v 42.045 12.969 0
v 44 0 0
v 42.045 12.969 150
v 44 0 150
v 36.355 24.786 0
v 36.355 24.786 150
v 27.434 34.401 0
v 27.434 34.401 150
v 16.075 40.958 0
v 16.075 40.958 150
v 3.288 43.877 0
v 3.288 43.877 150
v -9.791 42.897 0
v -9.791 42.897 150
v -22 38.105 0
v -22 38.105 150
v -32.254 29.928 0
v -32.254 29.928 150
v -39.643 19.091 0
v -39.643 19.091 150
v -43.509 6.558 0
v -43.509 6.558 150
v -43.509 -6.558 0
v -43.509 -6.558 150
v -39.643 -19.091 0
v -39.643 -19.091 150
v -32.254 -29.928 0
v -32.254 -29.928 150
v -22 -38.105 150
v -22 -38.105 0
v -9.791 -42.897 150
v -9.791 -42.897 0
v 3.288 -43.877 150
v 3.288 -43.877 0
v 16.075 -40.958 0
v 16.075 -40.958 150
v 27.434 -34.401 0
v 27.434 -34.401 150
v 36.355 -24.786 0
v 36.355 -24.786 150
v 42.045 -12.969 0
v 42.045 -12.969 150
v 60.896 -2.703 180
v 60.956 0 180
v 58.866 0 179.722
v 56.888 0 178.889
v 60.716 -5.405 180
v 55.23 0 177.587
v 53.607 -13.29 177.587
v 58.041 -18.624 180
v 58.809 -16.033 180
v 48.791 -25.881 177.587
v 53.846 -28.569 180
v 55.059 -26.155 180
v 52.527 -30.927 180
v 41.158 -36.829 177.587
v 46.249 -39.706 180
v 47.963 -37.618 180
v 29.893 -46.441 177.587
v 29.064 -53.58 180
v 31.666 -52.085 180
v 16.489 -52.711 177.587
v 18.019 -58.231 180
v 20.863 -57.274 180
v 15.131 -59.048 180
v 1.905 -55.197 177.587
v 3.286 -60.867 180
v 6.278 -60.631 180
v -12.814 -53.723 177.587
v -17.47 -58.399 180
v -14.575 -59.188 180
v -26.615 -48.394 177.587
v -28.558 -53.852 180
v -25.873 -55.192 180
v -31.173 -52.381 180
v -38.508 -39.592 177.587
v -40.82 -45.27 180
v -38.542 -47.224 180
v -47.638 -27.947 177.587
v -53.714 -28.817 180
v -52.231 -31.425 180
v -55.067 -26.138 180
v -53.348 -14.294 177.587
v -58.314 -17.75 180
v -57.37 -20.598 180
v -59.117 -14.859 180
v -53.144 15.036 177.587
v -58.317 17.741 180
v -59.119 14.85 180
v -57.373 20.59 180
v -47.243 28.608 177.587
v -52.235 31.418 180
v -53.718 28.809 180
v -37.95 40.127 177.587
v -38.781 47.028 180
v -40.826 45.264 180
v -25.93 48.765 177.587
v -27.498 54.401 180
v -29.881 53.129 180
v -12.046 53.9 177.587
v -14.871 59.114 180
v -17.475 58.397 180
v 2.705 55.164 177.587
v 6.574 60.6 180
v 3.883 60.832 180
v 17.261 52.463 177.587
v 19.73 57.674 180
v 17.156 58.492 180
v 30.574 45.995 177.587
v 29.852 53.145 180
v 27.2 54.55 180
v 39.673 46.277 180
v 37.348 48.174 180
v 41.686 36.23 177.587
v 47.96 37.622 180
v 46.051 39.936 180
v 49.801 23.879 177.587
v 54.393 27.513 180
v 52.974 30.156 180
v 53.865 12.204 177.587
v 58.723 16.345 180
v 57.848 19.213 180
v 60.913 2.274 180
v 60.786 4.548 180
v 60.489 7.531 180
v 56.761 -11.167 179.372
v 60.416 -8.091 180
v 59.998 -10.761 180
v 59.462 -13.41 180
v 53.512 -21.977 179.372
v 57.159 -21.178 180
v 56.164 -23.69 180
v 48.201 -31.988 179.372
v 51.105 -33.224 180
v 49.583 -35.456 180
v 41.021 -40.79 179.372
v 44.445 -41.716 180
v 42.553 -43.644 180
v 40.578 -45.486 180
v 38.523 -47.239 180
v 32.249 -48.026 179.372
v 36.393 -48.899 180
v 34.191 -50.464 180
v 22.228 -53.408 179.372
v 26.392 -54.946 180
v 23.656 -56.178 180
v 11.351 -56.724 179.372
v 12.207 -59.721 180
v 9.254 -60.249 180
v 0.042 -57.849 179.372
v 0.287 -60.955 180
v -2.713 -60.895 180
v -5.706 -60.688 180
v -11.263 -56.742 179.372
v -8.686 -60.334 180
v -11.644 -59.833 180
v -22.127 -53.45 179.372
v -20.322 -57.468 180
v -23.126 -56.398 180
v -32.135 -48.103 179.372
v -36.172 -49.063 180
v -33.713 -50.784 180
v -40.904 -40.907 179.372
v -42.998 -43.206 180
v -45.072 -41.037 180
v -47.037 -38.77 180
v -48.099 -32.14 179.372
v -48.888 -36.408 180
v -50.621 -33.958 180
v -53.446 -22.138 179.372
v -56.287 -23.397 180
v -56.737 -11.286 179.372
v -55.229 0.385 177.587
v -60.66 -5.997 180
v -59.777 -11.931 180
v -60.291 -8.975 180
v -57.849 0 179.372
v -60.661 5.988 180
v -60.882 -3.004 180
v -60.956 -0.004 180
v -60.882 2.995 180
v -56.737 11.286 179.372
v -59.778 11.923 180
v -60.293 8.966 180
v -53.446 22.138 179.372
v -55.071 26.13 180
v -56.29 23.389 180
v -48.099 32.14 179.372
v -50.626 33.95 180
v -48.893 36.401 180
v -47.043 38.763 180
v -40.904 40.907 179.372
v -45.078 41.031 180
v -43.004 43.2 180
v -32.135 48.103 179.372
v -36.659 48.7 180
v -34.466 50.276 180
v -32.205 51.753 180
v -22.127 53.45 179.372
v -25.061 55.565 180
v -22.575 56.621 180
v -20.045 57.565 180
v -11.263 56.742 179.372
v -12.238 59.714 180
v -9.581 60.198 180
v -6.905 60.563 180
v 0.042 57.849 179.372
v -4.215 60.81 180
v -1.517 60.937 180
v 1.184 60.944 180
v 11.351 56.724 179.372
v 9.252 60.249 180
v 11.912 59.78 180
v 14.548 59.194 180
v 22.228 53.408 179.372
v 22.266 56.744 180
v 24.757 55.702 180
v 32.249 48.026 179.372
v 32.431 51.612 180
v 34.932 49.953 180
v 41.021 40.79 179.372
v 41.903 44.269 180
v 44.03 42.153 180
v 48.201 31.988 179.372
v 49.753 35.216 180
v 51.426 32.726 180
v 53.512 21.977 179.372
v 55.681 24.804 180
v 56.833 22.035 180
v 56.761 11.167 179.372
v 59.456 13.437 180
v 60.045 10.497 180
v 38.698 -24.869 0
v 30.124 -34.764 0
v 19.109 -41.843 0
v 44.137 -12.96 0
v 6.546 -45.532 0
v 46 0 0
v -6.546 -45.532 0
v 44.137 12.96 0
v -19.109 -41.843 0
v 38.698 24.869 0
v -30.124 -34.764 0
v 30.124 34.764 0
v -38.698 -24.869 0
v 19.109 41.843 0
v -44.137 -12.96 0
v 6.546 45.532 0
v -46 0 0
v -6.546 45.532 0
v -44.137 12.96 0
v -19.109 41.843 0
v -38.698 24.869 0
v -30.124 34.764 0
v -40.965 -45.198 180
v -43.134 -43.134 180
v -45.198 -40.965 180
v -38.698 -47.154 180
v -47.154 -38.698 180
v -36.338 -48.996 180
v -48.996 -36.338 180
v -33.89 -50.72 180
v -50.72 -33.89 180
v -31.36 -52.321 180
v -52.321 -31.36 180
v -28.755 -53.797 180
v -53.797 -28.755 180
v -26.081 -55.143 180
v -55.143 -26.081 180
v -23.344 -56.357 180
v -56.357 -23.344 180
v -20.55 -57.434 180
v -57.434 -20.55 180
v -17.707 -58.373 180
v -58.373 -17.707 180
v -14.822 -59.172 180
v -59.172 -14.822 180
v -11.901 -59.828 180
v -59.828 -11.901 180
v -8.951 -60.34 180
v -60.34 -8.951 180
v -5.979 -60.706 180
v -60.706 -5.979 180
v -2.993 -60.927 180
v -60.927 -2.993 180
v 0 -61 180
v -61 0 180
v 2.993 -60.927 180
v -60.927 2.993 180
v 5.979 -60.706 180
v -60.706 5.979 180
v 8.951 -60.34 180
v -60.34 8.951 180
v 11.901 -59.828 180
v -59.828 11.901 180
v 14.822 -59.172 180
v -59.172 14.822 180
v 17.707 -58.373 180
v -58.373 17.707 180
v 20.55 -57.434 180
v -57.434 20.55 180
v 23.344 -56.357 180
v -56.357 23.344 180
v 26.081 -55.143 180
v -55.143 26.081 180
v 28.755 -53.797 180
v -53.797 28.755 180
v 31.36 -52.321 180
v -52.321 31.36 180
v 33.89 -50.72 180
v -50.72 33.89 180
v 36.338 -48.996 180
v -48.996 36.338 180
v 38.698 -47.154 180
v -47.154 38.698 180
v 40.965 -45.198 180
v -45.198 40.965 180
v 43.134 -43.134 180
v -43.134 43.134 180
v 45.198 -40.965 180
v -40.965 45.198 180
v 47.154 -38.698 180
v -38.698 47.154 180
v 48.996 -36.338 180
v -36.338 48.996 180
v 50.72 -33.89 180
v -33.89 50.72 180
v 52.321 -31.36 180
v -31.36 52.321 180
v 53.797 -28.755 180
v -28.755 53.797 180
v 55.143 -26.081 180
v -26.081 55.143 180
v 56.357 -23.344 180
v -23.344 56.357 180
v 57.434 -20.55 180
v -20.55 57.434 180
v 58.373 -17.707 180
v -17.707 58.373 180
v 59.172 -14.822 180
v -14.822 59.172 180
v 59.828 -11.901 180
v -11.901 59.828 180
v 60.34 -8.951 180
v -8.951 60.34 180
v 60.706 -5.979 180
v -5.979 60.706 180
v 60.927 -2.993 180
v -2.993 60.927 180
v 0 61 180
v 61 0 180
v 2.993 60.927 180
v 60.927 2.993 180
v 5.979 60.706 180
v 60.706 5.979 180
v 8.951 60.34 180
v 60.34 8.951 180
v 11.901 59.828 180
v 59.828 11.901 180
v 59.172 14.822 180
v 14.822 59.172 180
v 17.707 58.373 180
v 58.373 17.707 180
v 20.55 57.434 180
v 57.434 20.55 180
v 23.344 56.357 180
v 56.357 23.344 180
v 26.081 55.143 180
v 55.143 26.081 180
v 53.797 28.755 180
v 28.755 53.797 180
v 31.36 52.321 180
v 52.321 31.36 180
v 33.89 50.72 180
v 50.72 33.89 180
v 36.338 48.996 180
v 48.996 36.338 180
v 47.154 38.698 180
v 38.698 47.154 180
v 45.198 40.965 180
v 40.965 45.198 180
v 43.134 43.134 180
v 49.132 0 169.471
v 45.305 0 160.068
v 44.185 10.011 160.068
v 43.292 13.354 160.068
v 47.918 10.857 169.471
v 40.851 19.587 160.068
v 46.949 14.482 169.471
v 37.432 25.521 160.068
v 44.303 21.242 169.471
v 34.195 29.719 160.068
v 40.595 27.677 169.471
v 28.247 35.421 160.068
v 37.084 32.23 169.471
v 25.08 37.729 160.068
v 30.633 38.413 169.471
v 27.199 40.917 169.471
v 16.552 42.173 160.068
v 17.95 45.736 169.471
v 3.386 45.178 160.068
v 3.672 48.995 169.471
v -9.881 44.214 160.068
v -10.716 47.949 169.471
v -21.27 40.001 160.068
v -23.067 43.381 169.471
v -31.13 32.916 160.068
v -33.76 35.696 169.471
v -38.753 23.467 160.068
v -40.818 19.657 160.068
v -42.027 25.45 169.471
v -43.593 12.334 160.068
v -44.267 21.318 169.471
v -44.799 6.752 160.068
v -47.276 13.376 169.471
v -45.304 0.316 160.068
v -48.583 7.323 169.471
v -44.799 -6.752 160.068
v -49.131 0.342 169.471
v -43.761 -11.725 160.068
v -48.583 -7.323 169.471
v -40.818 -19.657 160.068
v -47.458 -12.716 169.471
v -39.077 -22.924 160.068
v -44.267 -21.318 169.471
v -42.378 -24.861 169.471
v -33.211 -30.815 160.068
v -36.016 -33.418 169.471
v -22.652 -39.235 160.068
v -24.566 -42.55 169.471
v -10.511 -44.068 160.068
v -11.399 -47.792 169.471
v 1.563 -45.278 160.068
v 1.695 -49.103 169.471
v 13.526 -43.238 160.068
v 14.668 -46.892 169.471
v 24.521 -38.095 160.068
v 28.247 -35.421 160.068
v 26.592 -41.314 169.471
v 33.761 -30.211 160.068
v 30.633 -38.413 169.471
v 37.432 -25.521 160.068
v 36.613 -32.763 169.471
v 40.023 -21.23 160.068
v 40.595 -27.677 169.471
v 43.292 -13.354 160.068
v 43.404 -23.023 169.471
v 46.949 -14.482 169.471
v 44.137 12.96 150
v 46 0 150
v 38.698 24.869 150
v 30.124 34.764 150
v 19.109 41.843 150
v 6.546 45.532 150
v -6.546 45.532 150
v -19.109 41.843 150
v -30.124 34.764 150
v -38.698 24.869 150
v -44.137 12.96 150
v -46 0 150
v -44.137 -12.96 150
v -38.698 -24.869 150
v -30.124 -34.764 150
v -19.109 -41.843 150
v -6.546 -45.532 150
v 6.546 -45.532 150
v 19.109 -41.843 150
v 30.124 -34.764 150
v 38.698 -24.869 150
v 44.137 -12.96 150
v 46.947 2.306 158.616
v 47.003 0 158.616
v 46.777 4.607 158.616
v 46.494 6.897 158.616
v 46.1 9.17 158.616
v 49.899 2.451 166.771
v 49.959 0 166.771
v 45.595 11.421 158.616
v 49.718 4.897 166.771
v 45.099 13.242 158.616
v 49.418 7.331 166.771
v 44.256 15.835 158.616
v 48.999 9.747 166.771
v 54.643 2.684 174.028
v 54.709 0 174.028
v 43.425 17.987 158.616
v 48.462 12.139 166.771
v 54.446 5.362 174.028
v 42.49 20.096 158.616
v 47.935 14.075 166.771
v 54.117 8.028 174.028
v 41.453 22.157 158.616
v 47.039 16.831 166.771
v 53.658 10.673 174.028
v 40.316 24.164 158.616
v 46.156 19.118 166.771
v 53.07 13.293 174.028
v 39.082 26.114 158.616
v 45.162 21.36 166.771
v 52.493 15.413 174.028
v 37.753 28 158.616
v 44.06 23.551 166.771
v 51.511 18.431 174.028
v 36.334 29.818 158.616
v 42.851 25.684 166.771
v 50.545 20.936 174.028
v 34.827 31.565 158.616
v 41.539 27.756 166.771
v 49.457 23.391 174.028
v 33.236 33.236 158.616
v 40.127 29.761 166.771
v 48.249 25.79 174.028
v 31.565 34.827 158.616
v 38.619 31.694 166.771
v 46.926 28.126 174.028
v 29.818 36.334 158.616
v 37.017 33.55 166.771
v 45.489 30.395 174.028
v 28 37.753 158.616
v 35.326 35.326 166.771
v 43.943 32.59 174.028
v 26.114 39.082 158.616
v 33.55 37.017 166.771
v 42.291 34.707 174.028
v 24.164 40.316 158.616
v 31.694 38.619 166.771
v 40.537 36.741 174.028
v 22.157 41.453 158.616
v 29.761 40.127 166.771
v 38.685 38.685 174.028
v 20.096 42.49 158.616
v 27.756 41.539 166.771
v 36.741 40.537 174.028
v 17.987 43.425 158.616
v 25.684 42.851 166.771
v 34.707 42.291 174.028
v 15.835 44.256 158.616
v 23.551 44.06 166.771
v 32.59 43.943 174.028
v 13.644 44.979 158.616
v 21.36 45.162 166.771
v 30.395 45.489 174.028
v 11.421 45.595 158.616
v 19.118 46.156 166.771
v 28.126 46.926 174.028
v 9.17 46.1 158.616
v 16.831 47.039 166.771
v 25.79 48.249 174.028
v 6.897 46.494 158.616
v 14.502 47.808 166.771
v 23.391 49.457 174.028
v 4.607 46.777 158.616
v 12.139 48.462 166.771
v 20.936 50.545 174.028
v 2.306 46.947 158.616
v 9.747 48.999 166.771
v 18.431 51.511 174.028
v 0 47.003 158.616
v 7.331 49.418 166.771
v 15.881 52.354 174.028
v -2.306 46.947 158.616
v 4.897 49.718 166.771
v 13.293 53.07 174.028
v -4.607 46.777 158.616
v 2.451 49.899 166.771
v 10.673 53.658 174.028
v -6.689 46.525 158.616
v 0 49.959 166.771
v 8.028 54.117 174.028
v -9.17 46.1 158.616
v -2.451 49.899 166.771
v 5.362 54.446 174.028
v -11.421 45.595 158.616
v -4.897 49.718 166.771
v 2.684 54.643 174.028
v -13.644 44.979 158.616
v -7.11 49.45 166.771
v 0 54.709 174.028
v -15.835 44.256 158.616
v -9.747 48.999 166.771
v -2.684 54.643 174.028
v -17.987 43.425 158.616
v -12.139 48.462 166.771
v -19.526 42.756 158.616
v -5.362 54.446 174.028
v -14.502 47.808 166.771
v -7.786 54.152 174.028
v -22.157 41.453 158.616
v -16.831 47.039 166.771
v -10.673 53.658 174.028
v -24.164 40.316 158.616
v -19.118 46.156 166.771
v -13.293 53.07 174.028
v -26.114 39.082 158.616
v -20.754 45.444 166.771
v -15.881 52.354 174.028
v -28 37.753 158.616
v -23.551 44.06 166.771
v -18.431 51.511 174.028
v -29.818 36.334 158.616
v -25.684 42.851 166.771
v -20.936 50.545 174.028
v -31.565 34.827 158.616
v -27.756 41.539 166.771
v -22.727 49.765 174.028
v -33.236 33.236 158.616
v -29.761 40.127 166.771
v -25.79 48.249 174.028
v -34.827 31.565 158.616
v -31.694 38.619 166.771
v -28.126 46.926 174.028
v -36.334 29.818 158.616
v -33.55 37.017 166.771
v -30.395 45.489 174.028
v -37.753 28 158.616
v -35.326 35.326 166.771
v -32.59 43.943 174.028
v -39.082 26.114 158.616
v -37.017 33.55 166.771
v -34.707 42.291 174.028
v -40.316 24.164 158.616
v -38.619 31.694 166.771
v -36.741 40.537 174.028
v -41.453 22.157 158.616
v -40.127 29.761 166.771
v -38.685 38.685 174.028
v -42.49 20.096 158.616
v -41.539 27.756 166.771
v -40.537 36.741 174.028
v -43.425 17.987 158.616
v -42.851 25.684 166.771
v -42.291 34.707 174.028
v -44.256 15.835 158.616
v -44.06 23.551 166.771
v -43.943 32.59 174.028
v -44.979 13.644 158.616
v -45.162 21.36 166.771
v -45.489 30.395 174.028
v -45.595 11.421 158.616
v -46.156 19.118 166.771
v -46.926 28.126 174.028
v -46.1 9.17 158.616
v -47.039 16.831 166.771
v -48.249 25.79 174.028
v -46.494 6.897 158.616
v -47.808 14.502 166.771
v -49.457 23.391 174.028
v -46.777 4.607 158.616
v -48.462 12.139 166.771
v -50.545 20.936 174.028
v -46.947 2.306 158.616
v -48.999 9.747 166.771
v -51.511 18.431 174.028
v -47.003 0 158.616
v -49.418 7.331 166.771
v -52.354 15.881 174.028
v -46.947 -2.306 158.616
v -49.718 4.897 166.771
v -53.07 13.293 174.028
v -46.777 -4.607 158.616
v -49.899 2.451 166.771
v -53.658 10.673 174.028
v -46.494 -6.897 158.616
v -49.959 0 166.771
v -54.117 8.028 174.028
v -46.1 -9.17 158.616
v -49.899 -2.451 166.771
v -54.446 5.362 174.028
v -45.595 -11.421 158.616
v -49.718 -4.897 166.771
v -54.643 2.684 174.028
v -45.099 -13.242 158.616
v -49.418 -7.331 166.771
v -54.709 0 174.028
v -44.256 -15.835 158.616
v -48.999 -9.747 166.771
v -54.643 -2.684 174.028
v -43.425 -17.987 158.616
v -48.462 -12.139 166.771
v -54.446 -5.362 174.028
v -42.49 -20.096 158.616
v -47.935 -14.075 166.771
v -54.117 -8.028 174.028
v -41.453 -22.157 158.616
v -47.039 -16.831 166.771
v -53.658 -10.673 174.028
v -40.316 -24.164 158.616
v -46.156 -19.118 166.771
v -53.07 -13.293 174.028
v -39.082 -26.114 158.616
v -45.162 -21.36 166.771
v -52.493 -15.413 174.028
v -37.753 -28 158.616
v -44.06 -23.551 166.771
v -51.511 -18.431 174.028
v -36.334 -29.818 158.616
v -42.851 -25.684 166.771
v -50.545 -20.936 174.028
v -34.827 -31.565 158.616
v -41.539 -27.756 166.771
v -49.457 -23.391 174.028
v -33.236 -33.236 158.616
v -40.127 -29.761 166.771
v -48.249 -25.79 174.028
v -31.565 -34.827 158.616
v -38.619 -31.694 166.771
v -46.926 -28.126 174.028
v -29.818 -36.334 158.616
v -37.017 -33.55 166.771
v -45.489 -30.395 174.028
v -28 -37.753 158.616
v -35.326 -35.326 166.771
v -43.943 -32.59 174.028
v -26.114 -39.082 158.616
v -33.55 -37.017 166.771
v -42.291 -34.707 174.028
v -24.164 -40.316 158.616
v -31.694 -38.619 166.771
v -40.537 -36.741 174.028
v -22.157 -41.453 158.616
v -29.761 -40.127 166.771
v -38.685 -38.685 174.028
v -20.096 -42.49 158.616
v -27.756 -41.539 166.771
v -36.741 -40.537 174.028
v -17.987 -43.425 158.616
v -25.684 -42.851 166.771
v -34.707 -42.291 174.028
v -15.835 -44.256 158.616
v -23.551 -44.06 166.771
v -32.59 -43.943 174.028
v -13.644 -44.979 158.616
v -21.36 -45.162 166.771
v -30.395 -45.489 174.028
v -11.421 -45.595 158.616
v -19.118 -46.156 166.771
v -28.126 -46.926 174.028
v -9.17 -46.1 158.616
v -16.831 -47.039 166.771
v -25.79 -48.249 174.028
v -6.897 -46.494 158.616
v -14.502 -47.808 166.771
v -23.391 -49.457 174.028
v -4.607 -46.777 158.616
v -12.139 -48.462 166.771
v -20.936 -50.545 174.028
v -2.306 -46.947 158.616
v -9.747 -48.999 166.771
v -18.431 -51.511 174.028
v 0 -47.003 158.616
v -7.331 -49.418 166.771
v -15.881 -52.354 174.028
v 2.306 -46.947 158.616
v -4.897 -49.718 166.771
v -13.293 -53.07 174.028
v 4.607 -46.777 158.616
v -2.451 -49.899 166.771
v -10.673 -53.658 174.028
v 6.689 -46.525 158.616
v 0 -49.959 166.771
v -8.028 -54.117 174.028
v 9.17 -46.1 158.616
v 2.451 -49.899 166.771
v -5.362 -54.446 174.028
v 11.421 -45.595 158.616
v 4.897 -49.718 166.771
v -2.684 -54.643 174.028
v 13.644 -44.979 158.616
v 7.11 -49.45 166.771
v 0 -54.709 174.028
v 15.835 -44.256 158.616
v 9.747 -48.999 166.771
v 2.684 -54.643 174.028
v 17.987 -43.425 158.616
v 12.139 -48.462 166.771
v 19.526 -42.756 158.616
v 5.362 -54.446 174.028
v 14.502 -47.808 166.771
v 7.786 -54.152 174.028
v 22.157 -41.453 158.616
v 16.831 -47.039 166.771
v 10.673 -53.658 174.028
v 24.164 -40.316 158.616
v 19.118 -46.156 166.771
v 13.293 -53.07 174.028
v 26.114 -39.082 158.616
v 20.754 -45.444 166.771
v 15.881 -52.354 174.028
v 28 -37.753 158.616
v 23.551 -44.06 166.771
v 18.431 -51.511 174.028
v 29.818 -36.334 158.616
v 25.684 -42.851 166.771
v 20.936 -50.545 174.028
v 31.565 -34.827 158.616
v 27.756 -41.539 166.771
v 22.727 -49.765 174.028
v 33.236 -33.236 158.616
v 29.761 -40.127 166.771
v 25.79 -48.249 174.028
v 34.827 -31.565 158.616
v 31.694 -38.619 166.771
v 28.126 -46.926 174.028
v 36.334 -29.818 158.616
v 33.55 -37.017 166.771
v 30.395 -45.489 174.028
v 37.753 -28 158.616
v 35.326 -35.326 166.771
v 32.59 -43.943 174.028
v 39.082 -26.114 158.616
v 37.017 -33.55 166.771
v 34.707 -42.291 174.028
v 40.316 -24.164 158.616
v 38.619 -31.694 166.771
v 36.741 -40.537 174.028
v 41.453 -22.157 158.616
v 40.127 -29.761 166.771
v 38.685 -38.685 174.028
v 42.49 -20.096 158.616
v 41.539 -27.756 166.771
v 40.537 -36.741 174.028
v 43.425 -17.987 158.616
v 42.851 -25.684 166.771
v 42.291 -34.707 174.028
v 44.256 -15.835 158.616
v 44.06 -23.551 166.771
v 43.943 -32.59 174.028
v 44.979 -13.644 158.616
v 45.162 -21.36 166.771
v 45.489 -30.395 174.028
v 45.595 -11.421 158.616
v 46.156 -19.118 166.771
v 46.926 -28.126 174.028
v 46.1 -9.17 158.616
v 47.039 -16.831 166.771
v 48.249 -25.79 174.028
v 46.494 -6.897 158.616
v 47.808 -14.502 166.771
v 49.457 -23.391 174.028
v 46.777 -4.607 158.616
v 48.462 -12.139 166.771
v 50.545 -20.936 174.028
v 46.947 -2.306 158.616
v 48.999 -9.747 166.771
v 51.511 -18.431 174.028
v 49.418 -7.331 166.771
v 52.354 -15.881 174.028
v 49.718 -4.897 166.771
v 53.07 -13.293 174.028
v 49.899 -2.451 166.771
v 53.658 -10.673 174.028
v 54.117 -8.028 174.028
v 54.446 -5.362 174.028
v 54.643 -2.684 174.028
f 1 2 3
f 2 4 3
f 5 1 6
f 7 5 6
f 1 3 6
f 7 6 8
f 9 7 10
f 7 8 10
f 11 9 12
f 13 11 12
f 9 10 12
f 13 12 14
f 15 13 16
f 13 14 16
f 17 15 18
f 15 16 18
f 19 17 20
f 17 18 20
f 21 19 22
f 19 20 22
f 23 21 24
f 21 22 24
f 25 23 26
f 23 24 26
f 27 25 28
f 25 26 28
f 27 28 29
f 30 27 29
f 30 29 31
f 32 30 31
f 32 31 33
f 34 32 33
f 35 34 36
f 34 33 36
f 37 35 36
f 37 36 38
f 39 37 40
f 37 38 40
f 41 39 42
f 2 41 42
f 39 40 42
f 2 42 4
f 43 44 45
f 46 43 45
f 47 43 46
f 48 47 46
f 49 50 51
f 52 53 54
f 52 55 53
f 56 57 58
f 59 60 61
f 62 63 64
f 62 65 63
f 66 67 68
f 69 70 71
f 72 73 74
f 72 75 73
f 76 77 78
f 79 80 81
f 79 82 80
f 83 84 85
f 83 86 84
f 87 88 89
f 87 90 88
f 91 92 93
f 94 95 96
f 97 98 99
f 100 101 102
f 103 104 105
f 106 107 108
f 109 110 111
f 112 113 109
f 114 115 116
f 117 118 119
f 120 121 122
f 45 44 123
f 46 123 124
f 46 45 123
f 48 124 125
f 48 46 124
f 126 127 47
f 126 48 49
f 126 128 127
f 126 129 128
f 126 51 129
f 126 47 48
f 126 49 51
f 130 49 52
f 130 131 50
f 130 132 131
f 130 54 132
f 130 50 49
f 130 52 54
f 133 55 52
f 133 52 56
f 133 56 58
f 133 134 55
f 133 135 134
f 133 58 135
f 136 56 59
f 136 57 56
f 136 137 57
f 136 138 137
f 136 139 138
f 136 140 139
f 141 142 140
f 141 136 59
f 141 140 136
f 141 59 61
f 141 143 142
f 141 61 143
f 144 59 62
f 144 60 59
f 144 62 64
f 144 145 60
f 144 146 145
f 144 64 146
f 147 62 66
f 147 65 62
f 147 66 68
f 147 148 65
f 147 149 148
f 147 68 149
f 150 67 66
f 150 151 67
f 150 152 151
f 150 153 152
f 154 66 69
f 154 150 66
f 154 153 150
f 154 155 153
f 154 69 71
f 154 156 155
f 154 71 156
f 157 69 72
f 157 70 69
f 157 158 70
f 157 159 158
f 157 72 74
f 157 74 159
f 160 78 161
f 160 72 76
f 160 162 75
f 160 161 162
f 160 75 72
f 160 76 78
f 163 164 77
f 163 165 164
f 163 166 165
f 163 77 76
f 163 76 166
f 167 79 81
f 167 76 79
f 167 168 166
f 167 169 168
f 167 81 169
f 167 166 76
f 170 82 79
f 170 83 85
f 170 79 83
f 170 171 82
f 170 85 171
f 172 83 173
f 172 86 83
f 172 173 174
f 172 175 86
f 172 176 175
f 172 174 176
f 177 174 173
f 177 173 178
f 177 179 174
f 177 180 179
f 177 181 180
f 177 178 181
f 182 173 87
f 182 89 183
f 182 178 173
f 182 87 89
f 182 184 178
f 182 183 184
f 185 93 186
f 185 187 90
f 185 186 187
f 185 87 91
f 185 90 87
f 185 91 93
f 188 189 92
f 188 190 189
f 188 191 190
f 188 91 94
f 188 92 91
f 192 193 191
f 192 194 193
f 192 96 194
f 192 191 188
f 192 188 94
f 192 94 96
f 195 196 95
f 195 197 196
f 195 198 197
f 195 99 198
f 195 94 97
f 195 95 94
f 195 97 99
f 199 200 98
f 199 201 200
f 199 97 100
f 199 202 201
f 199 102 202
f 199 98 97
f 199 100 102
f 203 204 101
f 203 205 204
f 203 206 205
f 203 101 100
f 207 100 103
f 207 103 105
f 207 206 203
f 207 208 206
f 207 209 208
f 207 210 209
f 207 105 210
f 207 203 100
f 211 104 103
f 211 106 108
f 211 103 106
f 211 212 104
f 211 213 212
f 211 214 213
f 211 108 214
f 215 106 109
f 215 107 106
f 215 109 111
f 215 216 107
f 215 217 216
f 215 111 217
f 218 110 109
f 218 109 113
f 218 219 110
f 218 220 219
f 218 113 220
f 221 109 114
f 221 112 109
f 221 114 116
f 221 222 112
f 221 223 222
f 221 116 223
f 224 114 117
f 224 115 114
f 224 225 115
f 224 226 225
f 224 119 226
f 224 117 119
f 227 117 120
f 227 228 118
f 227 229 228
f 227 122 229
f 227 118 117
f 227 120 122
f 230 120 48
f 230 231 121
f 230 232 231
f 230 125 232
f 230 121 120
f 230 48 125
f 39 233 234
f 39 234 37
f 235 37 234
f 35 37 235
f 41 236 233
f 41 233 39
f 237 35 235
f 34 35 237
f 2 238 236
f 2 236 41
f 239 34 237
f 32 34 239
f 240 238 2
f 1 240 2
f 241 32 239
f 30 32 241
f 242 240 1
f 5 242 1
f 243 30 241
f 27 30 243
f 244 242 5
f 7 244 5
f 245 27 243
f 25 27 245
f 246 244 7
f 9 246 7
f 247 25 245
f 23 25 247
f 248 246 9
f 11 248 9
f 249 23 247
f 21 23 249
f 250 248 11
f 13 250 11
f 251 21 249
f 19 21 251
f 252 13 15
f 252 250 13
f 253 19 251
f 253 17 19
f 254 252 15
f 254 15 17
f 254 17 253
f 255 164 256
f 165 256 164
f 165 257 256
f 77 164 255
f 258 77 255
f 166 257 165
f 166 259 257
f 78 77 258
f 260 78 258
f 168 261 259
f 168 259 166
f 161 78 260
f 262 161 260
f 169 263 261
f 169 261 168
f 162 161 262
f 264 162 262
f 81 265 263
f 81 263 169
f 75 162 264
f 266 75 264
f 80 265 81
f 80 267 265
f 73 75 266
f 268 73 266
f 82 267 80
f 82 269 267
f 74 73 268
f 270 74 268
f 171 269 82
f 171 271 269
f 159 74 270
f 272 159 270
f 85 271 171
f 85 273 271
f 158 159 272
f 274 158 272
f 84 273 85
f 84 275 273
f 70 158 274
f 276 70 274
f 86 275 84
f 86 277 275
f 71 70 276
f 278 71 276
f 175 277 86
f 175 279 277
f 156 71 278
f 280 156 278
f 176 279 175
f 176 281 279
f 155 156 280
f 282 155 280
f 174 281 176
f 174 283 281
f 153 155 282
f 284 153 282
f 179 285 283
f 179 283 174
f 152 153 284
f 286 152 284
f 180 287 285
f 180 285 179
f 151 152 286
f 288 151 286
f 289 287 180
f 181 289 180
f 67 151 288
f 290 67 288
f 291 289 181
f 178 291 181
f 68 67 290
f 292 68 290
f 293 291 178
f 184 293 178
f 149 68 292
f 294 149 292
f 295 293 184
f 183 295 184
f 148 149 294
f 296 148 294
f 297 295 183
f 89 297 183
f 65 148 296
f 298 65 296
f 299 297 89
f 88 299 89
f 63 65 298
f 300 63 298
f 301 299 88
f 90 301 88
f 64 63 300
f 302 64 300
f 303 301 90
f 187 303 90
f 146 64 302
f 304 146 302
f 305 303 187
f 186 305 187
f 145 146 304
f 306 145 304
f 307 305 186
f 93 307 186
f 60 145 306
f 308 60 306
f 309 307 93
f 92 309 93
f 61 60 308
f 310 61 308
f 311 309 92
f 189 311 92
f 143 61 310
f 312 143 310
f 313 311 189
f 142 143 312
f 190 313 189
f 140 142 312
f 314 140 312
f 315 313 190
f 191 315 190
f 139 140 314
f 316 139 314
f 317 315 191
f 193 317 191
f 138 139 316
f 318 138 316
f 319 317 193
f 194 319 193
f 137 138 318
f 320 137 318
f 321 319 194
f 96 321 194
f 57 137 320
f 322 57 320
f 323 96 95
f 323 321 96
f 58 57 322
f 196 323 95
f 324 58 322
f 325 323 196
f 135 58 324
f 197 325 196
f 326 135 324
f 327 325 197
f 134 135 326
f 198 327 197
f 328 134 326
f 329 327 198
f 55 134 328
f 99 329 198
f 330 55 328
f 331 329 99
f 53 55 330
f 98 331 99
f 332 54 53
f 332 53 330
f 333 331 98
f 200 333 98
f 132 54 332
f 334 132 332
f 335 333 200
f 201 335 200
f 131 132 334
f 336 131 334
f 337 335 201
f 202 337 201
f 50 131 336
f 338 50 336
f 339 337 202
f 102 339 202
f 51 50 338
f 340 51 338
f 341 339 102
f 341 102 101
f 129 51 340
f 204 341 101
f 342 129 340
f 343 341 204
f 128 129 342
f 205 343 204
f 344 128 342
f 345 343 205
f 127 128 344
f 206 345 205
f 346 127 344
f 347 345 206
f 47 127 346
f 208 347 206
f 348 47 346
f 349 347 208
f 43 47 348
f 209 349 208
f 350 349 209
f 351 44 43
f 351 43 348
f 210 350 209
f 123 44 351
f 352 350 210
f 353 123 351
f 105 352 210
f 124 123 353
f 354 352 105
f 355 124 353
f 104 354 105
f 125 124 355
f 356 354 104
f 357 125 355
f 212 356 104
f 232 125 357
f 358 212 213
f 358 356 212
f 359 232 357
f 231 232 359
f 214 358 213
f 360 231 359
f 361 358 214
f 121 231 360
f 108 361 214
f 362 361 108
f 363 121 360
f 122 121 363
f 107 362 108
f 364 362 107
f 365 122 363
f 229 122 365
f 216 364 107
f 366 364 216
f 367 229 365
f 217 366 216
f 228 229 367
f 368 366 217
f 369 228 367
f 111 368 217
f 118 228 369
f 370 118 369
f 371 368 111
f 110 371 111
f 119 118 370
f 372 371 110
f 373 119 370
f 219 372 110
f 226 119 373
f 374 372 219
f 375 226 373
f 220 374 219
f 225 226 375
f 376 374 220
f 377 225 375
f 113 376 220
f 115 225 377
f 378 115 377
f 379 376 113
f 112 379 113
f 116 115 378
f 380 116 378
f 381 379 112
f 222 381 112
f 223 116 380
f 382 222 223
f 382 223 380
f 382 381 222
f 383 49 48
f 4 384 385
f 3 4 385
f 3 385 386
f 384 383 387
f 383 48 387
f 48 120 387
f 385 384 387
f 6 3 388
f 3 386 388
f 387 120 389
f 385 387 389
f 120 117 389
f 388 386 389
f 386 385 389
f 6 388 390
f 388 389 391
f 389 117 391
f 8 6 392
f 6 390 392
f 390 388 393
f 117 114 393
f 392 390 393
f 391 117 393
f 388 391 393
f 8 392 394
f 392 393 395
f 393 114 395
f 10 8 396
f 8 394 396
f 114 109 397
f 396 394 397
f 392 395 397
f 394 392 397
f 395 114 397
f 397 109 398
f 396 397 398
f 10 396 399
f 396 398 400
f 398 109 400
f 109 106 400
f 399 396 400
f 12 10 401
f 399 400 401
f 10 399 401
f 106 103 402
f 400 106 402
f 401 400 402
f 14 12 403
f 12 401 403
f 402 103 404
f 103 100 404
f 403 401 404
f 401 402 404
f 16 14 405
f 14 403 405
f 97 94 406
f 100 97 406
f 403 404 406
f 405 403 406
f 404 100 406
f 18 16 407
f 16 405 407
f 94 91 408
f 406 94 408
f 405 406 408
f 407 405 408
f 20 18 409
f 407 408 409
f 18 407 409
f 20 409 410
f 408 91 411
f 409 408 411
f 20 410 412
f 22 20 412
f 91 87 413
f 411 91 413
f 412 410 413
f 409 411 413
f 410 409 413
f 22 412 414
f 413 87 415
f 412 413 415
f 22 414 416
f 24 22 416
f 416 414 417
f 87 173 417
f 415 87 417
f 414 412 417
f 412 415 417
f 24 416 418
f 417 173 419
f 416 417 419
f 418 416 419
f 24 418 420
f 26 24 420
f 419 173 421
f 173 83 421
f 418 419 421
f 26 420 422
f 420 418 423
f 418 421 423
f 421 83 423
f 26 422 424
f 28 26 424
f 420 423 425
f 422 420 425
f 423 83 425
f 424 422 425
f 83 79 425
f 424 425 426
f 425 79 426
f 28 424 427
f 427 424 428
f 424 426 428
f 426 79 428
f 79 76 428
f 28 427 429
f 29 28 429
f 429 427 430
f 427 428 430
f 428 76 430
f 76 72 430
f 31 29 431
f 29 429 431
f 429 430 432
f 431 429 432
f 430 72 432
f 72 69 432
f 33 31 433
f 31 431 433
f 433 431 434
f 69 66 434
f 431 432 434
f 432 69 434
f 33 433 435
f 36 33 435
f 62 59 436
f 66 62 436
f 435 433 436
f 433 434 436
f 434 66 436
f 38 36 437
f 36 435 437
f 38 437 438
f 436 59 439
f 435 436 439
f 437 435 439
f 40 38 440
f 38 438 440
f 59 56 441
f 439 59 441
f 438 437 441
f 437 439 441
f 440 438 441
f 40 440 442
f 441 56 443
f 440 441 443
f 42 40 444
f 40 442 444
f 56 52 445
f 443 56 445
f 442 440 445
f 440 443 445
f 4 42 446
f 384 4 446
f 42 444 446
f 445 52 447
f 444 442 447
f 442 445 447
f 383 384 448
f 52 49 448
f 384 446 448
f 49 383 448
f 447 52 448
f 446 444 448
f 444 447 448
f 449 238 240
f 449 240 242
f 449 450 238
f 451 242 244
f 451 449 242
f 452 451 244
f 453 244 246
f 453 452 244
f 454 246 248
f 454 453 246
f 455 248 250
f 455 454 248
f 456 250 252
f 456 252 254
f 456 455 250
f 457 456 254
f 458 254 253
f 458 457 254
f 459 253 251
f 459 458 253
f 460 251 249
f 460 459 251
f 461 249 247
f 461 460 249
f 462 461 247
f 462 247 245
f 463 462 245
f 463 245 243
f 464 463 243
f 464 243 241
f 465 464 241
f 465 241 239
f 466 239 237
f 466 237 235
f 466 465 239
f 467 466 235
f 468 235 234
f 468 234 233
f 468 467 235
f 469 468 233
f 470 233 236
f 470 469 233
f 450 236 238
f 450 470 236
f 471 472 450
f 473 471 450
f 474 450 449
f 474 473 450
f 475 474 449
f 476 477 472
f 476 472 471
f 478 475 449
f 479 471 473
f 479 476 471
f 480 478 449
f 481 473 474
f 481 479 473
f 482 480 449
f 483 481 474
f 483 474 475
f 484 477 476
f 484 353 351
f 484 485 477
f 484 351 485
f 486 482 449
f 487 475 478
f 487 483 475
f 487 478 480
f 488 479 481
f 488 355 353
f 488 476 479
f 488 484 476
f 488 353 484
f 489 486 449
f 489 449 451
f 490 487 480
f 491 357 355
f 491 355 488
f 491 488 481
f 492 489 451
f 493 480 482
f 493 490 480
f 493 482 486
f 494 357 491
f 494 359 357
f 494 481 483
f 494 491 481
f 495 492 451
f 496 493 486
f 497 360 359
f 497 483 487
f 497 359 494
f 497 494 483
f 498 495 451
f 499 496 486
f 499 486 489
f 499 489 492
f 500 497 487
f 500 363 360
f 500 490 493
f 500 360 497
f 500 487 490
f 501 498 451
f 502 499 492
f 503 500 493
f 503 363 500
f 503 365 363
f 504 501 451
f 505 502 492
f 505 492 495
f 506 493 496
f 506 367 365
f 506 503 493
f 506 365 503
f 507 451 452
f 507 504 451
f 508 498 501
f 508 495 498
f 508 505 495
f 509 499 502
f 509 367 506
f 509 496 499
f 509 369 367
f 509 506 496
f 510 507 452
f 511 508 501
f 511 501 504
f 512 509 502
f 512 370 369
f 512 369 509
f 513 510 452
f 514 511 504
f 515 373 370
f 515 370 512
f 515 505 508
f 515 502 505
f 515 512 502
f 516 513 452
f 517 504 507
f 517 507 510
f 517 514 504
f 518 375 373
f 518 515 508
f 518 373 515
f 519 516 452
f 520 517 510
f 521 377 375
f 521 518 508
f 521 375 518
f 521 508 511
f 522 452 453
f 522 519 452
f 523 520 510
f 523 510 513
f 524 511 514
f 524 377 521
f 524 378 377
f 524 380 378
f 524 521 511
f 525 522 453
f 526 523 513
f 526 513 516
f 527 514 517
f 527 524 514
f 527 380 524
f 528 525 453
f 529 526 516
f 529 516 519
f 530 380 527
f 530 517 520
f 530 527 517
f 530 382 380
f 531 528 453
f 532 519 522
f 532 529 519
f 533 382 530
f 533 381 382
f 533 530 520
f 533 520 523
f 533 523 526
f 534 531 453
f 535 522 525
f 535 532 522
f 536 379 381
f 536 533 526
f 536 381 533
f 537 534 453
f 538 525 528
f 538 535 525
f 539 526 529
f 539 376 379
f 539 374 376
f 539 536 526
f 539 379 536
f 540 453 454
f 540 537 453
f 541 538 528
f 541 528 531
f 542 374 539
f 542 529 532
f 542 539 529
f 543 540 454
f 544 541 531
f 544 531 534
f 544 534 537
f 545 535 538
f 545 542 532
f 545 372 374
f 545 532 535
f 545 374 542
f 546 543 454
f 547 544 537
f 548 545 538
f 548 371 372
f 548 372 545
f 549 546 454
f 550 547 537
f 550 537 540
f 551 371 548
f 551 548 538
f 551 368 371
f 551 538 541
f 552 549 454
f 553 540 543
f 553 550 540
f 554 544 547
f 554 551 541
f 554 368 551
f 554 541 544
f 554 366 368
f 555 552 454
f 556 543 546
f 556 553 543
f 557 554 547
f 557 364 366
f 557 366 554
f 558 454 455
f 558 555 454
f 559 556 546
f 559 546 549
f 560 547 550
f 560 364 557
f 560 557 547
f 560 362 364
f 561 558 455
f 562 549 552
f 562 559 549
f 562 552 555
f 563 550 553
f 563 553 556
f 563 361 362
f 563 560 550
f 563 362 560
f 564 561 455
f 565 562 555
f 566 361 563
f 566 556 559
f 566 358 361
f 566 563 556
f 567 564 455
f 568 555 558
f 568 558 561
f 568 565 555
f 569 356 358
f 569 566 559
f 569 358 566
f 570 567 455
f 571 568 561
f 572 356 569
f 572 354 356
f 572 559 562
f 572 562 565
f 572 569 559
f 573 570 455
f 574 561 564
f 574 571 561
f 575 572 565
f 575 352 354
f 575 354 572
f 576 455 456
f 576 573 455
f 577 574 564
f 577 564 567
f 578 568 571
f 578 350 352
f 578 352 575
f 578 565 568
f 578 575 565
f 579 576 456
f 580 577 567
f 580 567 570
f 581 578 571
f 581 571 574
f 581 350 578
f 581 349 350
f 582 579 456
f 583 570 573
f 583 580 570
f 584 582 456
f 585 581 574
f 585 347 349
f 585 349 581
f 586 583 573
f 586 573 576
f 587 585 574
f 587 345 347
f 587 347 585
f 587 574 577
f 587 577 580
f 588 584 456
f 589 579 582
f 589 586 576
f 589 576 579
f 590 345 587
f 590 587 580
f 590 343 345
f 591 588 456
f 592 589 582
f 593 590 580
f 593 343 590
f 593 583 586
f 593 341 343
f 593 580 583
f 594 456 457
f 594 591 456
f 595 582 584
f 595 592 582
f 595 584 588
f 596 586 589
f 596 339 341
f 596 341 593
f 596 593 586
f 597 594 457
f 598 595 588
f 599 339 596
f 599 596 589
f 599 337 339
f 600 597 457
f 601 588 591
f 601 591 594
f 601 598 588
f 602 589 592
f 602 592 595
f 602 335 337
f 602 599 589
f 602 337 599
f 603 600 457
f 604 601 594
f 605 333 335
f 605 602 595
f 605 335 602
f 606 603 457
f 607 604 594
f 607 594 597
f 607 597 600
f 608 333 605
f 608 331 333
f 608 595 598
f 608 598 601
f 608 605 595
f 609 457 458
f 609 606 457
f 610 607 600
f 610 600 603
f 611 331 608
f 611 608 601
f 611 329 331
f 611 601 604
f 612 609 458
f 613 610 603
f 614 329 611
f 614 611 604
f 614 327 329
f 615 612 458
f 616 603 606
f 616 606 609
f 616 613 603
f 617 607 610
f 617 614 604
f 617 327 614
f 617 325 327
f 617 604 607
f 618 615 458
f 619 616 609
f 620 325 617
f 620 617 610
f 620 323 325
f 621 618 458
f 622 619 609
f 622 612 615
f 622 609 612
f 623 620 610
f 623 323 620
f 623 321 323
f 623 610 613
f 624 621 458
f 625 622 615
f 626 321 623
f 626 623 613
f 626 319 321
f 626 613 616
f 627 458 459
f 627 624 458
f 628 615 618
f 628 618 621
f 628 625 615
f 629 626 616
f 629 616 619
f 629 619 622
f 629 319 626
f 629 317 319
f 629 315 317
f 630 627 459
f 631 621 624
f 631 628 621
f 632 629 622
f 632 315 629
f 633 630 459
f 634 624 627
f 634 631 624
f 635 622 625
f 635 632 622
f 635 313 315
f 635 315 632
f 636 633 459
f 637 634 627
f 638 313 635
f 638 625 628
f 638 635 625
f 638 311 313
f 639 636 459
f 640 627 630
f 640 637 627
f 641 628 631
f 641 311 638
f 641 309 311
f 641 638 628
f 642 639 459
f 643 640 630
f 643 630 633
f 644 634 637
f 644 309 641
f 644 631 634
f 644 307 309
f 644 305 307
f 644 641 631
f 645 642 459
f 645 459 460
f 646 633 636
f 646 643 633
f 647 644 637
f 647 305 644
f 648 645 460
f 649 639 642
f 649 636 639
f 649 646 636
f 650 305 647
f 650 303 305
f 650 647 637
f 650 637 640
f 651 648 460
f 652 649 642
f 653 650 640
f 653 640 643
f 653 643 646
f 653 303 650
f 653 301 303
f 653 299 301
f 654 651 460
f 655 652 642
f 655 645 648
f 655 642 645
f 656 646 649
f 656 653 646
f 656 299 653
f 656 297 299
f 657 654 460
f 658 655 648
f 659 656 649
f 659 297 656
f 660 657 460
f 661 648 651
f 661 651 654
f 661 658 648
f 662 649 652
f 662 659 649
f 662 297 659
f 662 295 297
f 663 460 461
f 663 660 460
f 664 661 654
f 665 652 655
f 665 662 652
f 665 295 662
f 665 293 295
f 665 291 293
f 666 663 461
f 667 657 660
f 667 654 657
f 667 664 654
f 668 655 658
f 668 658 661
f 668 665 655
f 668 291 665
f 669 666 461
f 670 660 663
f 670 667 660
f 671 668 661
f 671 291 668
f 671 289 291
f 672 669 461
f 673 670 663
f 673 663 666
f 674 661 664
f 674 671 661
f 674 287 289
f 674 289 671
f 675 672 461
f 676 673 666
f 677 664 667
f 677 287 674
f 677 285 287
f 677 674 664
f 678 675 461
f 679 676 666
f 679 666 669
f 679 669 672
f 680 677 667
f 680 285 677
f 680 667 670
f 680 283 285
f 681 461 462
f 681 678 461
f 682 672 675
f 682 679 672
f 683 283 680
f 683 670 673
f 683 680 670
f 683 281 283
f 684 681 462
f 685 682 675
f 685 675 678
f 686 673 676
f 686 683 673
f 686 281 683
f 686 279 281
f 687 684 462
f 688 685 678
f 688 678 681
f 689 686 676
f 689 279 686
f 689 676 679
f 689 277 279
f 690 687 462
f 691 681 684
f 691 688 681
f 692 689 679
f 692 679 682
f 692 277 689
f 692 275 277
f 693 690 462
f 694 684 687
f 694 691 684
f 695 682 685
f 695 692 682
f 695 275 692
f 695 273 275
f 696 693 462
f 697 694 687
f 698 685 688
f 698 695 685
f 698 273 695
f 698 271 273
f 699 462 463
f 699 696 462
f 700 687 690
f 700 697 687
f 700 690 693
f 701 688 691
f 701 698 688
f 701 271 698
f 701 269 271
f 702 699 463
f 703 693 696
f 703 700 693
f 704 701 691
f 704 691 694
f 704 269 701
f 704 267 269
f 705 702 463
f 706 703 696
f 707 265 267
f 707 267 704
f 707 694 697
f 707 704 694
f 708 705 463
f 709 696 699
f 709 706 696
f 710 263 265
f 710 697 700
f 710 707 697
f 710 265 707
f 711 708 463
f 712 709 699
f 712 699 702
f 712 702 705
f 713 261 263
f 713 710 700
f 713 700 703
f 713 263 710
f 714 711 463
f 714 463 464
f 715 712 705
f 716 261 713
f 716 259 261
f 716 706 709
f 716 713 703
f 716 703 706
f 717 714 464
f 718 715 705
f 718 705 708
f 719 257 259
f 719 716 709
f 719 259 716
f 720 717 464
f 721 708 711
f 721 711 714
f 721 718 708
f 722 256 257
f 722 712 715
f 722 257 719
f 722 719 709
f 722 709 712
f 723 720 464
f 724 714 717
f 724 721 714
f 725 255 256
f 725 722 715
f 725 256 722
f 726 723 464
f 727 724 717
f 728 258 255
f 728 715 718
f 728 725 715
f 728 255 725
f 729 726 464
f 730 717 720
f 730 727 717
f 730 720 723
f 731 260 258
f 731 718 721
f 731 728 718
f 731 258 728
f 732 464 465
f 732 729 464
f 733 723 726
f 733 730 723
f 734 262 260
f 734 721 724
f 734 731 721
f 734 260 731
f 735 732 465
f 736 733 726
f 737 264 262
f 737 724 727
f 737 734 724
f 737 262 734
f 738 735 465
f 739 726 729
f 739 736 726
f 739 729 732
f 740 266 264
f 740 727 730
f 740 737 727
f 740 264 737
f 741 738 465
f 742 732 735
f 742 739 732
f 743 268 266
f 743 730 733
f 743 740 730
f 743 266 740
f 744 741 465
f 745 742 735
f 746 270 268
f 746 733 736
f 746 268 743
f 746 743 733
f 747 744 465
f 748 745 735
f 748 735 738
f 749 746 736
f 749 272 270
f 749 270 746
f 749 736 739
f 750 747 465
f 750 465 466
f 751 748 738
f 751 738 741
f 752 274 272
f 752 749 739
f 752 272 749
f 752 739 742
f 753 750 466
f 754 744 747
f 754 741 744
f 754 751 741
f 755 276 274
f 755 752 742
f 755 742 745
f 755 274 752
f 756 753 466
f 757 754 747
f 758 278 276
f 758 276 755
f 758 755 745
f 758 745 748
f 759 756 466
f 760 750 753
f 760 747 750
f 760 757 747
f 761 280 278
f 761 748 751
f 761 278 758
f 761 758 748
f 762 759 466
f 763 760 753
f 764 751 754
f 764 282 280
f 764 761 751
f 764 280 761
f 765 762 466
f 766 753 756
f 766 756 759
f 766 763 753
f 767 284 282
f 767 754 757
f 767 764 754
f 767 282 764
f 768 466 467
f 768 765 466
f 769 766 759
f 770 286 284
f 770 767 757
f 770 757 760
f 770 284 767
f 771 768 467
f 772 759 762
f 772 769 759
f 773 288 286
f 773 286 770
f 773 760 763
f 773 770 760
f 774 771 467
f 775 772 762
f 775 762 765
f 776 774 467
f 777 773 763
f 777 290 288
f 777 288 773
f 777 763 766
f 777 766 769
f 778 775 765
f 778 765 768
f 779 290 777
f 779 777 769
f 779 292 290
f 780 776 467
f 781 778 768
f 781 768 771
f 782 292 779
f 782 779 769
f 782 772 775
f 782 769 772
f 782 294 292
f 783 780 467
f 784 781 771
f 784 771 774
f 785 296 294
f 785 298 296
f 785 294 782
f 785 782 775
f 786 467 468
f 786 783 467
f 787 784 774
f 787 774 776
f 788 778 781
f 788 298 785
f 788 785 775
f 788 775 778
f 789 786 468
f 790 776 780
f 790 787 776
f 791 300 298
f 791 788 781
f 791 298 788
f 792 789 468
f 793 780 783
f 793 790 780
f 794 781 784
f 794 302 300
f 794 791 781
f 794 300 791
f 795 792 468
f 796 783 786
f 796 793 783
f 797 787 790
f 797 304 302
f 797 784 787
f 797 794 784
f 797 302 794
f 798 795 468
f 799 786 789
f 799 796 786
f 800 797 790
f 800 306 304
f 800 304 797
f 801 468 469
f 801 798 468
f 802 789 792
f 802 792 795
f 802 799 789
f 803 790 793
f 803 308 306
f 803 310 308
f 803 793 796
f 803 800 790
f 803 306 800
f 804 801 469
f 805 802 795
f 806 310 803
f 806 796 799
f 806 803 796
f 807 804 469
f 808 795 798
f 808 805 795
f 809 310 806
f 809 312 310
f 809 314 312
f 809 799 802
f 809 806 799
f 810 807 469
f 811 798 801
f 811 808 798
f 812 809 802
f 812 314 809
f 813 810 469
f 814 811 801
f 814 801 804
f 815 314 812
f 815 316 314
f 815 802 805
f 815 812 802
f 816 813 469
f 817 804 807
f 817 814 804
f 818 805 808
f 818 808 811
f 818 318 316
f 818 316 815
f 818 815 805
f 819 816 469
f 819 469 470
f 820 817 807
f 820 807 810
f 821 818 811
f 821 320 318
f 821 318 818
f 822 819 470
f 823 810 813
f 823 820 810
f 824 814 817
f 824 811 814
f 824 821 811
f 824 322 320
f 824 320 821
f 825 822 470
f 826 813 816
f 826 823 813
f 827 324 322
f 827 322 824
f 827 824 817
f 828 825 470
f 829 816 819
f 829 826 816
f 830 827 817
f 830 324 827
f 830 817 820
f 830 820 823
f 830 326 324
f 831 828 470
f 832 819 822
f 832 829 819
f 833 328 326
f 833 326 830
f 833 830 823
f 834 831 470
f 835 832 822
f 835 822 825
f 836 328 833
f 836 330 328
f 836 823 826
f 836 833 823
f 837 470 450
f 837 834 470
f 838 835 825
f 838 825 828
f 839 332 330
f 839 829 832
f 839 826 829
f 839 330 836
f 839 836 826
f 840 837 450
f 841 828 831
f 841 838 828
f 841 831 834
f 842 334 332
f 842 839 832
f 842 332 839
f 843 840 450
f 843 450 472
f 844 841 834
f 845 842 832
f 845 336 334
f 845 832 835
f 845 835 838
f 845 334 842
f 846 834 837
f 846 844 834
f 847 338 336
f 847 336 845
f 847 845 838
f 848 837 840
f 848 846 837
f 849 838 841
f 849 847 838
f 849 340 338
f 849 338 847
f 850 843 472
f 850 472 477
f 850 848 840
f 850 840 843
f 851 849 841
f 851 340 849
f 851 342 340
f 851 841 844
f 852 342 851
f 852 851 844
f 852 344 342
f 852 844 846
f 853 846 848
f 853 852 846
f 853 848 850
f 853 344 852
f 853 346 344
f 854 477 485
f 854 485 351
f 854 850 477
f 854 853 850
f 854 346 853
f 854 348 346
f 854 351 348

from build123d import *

# Parameters (mm, degrees)
F2_T = -2
F3_R = 8


with BuildPart() as f1:
    # F0 (on Front) → F1 (revolve)
    with BuildSketch(Plane.XZ):
        with BuildLine():
            Line((0, 180), (0, 0))
            Line((0, 0), (46, 0))
            Line((46, 0), (46, 150))
            ThreePointArc((46, 150), (49.9589803375, 166.7705098312), (61, 180))
            Line((61, 180), (0, 180))
        make_face()
    revolve(axis=Axis((0, 0, 90), (0, 0, 1)))

    # F2
    f2_openings = [f1.faces().sort_by_distance(p)[0] for p in [
        (0, 0, 180),
        (0, 0, 0),
    ]]
    offset(amount=F2_T, openings=f2_openings)

    # F3
    f3_edges = [f1.edges().sort_by_distance(p)[0] for p in [
        (-57.80467, 0, 180),
    ]]
    fillet(f3_edges, radius=F3_R)


solid = f1.part
